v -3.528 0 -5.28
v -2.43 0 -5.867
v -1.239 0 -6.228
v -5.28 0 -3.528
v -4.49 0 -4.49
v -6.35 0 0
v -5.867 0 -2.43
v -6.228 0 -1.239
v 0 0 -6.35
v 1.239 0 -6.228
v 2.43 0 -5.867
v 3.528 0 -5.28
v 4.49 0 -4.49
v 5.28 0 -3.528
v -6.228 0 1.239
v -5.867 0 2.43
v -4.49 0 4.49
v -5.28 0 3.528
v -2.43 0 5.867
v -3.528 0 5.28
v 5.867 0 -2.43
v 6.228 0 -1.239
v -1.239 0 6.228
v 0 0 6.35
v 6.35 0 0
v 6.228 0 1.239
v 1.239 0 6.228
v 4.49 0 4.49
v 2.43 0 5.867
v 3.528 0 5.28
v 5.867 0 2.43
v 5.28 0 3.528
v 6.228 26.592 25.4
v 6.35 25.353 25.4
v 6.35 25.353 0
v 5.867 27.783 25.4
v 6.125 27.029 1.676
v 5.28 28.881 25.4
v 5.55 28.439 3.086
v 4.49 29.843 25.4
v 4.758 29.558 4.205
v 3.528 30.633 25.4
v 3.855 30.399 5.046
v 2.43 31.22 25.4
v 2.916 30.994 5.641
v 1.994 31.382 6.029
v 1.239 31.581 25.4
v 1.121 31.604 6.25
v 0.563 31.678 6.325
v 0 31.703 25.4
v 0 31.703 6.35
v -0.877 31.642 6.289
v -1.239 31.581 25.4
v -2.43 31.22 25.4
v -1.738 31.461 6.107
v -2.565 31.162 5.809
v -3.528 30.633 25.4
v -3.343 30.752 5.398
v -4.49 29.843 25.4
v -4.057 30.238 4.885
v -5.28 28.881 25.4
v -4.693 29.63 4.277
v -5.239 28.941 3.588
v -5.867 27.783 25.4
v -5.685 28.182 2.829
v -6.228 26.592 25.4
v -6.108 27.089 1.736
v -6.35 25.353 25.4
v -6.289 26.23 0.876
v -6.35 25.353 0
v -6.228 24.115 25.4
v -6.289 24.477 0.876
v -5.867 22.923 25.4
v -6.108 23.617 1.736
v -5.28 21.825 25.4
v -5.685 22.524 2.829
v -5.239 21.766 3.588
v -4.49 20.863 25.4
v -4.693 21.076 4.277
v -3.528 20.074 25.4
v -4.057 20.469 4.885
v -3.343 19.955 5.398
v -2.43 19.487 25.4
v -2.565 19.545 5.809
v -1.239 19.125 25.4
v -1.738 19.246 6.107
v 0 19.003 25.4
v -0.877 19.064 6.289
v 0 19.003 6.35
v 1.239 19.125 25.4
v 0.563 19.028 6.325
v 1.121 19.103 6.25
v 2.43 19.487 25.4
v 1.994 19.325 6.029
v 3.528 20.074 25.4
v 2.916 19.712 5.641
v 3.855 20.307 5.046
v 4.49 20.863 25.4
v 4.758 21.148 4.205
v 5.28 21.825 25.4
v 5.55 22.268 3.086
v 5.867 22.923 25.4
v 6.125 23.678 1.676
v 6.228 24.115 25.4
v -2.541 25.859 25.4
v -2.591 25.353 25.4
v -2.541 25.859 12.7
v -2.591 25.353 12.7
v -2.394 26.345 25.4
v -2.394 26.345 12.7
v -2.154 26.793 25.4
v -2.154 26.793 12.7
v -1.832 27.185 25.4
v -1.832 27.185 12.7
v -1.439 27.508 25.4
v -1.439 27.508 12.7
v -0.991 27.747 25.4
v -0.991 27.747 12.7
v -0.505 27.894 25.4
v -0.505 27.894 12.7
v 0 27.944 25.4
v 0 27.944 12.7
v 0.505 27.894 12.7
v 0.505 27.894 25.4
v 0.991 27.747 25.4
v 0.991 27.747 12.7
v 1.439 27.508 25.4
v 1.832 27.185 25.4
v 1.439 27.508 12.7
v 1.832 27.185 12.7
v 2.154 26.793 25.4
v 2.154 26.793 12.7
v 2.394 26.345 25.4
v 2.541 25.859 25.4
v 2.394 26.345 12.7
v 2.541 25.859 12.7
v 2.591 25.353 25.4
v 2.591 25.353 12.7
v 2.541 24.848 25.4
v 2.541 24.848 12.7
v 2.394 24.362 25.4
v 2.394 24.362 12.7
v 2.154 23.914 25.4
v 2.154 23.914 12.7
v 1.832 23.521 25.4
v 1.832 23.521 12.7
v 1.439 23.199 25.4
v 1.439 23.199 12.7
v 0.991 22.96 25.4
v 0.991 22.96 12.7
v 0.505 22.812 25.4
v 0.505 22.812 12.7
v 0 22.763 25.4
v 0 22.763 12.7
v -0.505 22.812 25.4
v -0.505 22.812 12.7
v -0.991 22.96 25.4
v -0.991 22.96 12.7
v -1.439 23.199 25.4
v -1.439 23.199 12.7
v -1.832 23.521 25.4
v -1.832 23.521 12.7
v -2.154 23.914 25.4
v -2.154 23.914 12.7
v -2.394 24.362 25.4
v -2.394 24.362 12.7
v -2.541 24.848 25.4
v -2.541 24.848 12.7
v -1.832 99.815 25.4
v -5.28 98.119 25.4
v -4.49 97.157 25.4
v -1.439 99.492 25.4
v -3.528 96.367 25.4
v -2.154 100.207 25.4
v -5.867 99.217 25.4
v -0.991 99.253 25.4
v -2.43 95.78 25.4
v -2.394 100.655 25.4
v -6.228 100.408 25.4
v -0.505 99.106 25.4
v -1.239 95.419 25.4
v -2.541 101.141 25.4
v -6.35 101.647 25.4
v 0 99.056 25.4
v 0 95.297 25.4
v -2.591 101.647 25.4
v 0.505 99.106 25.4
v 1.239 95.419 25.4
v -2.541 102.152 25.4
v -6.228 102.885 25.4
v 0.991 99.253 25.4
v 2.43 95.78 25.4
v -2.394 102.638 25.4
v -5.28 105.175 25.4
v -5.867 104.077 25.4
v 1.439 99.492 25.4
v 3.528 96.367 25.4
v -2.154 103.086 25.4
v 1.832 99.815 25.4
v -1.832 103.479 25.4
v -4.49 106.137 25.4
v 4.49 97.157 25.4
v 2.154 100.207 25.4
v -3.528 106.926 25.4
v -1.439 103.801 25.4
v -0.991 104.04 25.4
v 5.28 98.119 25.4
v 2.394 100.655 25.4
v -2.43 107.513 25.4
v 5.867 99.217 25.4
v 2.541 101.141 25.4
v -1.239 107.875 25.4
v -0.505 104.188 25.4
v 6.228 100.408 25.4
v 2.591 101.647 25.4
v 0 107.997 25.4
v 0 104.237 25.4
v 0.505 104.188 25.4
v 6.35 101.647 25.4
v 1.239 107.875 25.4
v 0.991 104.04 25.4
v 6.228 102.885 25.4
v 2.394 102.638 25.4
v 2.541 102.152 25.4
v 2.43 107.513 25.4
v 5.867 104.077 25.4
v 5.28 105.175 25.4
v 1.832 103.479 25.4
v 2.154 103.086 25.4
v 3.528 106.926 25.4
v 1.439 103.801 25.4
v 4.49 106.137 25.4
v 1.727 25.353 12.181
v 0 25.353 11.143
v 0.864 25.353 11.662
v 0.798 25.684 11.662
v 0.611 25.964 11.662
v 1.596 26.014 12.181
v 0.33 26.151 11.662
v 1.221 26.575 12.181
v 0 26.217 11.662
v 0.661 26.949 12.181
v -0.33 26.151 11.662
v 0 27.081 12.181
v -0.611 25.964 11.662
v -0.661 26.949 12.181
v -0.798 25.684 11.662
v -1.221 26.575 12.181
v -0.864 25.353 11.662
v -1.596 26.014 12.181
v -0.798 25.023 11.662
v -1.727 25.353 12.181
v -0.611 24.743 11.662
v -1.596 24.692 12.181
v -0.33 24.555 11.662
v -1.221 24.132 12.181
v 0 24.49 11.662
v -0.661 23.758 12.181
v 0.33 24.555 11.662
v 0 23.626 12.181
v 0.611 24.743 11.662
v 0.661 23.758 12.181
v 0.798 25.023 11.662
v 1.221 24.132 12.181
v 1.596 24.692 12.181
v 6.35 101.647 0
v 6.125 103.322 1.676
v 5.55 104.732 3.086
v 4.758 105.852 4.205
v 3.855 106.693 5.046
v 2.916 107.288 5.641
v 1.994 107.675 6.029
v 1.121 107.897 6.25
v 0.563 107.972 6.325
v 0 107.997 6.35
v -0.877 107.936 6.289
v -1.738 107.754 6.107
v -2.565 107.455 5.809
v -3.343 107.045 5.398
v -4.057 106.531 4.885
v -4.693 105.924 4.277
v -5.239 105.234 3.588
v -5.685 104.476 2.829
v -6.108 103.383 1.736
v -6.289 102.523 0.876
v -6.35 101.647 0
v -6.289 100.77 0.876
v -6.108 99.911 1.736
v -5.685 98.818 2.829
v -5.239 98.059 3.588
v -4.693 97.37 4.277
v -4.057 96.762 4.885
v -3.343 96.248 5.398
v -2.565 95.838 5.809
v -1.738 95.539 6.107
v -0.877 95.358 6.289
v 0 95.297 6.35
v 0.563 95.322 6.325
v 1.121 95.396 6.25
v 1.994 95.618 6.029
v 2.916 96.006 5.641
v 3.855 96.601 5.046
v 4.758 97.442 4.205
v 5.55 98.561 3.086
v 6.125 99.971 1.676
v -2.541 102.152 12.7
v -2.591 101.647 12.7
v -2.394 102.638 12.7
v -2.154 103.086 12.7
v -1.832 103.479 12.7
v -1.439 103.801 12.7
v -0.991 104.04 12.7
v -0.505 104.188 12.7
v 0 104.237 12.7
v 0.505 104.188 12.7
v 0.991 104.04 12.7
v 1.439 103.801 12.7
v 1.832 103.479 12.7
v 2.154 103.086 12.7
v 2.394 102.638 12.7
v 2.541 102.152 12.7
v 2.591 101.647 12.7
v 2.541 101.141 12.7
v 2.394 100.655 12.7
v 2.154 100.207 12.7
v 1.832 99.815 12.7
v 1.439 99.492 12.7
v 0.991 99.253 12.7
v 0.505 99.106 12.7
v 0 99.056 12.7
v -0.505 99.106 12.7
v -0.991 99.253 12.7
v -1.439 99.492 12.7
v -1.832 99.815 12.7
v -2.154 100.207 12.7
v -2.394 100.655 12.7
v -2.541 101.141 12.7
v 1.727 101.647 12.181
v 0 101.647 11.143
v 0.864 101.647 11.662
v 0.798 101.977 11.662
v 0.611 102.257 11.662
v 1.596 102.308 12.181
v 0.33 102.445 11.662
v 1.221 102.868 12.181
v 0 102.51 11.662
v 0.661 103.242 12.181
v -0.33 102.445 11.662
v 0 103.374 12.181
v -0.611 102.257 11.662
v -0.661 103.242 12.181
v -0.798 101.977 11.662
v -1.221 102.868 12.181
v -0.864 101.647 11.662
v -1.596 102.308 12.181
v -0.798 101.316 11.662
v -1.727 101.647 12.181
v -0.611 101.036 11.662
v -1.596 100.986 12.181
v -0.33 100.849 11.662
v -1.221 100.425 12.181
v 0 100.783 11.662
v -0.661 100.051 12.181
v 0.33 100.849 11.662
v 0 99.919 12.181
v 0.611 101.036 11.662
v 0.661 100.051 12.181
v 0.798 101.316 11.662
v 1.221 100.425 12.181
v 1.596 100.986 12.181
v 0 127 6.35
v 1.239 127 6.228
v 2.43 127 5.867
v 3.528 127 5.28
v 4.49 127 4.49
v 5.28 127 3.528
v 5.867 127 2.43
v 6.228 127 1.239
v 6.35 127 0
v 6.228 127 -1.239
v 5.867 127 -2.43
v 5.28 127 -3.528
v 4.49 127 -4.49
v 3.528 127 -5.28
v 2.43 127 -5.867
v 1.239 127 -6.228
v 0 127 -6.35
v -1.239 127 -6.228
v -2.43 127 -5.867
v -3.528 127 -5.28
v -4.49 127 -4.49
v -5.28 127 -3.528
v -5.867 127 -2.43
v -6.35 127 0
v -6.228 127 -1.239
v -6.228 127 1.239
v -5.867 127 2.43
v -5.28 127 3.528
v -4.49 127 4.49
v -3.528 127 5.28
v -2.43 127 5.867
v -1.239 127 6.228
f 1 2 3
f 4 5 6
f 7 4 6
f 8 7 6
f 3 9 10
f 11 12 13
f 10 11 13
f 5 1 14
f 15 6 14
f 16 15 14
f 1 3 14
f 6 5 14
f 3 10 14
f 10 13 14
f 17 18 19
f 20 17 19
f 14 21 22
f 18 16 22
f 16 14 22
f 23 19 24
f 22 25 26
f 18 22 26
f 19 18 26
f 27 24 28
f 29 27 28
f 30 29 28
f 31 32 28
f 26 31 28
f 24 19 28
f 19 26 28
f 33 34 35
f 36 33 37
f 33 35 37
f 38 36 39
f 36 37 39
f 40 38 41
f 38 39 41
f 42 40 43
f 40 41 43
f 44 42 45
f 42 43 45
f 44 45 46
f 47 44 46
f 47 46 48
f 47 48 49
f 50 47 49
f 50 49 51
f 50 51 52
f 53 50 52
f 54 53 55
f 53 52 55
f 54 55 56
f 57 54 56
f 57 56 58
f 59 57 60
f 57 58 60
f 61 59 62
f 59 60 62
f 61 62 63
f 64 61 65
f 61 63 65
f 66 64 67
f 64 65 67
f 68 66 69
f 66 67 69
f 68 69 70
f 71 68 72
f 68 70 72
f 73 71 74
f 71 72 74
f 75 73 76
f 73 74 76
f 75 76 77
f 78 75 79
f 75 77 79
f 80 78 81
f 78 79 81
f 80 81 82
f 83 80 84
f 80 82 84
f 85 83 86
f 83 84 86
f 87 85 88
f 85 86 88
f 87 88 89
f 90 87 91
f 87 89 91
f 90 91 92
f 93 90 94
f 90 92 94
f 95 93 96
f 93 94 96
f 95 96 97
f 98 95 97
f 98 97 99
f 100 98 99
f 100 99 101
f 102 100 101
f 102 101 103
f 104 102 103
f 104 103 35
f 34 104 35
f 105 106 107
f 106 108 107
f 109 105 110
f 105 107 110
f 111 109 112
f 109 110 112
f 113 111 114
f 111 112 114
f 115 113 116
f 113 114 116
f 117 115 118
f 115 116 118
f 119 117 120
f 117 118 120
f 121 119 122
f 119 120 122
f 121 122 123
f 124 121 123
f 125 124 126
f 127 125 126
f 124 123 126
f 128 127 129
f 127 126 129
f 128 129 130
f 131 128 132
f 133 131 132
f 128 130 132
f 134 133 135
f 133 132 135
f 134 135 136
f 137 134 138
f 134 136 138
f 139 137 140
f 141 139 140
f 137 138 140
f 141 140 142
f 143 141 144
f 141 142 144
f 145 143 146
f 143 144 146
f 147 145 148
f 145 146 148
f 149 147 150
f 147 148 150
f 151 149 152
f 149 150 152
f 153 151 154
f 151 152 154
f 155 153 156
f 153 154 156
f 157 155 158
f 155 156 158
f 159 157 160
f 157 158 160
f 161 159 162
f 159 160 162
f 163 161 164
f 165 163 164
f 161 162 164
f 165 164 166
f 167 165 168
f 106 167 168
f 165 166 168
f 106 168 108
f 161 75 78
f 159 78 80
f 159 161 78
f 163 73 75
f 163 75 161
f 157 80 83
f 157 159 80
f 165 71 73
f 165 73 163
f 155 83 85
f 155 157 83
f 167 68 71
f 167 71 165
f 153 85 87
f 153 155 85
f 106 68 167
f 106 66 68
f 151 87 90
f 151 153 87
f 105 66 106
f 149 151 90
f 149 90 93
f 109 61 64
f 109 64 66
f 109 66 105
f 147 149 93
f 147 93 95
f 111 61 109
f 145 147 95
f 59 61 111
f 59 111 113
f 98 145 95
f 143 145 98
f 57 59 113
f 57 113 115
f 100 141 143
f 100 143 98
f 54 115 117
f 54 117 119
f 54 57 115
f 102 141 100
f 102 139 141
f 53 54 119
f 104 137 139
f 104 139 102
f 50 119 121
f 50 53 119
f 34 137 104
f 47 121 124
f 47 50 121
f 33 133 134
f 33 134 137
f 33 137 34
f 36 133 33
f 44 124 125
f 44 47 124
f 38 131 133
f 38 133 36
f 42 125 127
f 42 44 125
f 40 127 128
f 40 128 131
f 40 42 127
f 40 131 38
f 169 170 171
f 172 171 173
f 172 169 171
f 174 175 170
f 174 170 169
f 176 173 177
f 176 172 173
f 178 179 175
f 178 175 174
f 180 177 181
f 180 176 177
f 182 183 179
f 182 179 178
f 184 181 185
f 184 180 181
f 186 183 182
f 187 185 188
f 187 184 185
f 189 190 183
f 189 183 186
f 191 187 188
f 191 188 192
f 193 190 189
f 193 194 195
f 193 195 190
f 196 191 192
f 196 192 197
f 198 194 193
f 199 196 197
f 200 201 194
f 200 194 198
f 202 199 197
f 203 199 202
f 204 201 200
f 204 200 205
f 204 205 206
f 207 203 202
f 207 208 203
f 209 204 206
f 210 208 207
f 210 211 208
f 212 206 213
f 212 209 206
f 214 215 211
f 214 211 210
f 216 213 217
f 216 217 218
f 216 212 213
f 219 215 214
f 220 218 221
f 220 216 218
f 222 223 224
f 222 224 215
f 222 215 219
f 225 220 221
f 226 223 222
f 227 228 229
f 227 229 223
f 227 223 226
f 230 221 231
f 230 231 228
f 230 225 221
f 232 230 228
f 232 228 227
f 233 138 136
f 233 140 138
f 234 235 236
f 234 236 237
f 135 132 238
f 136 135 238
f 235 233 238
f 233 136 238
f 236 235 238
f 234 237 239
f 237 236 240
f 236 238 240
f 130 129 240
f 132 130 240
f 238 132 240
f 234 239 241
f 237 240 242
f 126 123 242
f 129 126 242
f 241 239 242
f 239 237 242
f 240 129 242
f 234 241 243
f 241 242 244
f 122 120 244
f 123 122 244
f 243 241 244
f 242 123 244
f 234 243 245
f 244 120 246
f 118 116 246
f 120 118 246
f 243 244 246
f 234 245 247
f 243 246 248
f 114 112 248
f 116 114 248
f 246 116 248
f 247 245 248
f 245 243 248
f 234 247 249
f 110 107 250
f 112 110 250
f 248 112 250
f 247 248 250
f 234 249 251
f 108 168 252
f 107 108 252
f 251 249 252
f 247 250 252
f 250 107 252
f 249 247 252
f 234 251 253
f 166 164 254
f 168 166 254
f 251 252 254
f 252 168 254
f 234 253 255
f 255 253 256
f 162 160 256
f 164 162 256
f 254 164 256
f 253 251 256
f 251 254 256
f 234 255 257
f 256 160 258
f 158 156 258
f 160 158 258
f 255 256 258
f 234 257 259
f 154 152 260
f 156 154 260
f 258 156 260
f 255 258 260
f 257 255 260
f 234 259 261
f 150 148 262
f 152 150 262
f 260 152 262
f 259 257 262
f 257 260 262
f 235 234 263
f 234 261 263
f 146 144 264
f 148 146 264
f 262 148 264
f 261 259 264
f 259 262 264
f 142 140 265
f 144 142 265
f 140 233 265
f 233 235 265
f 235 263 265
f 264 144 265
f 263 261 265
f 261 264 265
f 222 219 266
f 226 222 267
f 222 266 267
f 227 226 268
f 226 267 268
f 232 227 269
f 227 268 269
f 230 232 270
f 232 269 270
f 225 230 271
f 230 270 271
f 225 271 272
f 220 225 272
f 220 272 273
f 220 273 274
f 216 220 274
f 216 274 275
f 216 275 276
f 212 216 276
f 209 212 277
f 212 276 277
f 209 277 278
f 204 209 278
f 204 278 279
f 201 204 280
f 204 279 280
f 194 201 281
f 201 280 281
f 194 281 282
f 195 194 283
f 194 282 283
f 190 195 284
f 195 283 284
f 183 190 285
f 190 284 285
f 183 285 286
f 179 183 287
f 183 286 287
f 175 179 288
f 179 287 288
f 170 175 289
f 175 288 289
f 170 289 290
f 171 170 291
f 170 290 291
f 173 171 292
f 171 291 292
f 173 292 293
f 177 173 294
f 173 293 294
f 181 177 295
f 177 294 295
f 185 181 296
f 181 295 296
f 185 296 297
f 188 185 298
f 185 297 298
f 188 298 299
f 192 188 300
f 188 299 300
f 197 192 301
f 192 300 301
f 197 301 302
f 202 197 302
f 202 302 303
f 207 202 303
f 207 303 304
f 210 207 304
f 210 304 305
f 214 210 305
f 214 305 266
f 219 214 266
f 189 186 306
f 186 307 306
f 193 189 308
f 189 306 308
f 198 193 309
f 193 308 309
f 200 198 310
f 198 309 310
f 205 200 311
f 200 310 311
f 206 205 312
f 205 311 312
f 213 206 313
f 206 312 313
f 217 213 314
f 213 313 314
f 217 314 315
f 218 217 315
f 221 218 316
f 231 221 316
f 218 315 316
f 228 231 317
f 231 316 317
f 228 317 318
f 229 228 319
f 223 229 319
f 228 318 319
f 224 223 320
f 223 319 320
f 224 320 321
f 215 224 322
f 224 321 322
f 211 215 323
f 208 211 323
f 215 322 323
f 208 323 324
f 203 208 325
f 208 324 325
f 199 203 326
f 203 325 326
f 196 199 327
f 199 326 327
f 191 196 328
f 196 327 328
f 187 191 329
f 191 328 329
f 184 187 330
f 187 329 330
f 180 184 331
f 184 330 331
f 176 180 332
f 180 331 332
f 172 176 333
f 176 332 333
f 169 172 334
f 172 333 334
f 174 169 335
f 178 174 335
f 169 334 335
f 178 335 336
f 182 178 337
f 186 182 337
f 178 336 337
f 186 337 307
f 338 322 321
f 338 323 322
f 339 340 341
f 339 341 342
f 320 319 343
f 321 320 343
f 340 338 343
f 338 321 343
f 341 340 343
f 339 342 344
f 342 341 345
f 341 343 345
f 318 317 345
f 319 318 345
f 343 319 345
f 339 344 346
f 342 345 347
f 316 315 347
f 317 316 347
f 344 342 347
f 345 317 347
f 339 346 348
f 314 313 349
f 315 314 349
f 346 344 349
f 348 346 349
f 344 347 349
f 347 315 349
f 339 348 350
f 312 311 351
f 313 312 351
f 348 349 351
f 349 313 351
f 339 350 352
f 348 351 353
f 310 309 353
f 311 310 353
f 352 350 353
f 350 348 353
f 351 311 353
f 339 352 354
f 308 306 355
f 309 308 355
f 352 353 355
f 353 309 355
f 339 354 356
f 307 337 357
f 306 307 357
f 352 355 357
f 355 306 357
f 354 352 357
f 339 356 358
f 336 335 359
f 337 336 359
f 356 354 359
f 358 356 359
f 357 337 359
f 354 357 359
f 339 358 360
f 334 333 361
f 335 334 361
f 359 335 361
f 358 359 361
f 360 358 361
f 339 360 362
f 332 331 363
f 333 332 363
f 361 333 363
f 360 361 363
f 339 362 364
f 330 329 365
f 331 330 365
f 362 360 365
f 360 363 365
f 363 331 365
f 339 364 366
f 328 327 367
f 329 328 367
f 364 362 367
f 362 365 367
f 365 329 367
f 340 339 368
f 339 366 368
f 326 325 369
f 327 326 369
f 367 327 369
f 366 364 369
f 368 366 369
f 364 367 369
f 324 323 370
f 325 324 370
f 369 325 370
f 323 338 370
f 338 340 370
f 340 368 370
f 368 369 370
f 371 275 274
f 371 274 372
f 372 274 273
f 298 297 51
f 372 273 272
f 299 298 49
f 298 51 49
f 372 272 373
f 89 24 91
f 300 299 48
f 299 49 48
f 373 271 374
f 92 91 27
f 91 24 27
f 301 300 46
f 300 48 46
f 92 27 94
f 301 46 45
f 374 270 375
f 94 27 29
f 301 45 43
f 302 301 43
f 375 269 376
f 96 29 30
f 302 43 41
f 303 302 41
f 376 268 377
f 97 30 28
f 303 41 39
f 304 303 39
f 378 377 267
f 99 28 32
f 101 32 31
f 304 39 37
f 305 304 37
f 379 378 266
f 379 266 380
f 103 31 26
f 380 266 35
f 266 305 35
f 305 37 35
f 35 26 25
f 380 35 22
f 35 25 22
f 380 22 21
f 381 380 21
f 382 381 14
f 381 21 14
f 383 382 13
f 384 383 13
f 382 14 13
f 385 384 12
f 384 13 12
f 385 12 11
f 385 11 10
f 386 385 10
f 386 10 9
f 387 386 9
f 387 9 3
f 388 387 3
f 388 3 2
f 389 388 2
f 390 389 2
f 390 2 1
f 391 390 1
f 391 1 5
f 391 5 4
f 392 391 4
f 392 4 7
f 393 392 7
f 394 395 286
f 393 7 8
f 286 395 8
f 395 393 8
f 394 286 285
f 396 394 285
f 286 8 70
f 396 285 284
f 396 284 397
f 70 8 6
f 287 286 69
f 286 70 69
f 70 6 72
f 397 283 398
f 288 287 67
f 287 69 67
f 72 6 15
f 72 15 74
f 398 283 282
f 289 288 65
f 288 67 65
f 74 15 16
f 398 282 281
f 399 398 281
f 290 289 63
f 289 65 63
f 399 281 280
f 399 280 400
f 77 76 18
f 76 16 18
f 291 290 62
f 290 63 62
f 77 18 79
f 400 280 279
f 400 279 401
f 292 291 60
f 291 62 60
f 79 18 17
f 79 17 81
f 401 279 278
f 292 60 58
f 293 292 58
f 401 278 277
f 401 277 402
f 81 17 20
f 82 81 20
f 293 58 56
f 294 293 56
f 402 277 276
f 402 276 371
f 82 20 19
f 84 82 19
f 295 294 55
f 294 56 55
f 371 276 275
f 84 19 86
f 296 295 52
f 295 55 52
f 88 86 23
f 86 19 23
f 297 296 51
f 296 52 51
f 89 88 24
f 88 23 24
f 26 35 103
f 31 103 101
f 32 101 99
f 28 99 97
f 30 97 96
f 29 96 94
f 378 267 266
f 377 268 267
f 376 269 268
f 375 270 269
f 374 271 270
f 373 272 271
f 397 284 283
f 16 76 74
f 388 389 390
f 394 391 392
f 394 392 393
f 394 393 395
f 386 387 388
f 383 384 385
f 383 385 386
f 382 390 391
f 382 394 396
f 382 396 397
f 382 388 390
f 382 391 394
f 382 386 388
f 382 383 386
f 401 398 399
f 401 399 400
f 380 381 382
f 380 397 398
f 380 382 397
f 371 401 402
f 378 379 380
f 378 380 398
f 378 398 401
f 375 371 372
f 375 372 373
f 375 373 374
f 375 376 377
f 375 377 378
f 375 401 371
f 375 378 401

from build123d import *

# Parameters (mm, degrees)
SKETCH2_R                      = 6.35
BOSS_EXTRUDE1_DEPTH            = 127
SKETCH3_R                      = 6.35
BOSS_EXTRUDE2_DEPTH            = 25.4
F_6_0_204_DIAMETER_HOLE1_D     = 5.1816
F_6_0_204_DIAMETER_HOLE1_DEPTH = 12.7
F_6_0_204_DIAMETER_HOLE1_TIP   = 1.556709692


with BuildPart() as part:
    # Sketch2 → Boss-Extrude1 (new body)
    with BuildSketch(Plane(origin=(0, 0, 0), x_dir=(1, 0, 0), z_dir=(0, 1, 0))):
        with Locations(Location((0, 0, 0), (0, 0, 270))):
            Circle(SKETCH2_R)
    extrude(amount=BOSS_EXTRUDE1_DEPTH)

    # Sketch3 → Boss-Extrude2 (add)
    with BuildSketch(Plane.XY):
        with Locations((0, 101.646656128)):
            Circle(SKETCH3_R)
        with Locations((0, 25.353343872)):
            Circle(SKETCH3_R)
    extrude(amount=BOSS_EXTRUDE2_DEPTH)

    # #6 (0.204) Diameter Hole1
    with Locations(Plane.XY.offset(25.4)):
        with Locations((0, 101.646656128), (0, 25.353343872)):
            Hole(F_6_0_204_DIAMETER_HOLE1_D / 2, depth=F_6_0_204_DIAMETER_HOLE1_DEPTH)
            with Locations((0, 0, -(F_6_0_204_DIAMETER_HOLE1_DEPTH + F_6_0_204_DIAMETER_HOLE1_TIP / 2))):  # 118° drill point
                Cone(0, F_6_0_204_DIAMETER_HOLE1_D / 2, F_6_0_204_DIAMETER_HOLE1_TIP, mode=Mode.SUBTRACT)


solid = part.part
